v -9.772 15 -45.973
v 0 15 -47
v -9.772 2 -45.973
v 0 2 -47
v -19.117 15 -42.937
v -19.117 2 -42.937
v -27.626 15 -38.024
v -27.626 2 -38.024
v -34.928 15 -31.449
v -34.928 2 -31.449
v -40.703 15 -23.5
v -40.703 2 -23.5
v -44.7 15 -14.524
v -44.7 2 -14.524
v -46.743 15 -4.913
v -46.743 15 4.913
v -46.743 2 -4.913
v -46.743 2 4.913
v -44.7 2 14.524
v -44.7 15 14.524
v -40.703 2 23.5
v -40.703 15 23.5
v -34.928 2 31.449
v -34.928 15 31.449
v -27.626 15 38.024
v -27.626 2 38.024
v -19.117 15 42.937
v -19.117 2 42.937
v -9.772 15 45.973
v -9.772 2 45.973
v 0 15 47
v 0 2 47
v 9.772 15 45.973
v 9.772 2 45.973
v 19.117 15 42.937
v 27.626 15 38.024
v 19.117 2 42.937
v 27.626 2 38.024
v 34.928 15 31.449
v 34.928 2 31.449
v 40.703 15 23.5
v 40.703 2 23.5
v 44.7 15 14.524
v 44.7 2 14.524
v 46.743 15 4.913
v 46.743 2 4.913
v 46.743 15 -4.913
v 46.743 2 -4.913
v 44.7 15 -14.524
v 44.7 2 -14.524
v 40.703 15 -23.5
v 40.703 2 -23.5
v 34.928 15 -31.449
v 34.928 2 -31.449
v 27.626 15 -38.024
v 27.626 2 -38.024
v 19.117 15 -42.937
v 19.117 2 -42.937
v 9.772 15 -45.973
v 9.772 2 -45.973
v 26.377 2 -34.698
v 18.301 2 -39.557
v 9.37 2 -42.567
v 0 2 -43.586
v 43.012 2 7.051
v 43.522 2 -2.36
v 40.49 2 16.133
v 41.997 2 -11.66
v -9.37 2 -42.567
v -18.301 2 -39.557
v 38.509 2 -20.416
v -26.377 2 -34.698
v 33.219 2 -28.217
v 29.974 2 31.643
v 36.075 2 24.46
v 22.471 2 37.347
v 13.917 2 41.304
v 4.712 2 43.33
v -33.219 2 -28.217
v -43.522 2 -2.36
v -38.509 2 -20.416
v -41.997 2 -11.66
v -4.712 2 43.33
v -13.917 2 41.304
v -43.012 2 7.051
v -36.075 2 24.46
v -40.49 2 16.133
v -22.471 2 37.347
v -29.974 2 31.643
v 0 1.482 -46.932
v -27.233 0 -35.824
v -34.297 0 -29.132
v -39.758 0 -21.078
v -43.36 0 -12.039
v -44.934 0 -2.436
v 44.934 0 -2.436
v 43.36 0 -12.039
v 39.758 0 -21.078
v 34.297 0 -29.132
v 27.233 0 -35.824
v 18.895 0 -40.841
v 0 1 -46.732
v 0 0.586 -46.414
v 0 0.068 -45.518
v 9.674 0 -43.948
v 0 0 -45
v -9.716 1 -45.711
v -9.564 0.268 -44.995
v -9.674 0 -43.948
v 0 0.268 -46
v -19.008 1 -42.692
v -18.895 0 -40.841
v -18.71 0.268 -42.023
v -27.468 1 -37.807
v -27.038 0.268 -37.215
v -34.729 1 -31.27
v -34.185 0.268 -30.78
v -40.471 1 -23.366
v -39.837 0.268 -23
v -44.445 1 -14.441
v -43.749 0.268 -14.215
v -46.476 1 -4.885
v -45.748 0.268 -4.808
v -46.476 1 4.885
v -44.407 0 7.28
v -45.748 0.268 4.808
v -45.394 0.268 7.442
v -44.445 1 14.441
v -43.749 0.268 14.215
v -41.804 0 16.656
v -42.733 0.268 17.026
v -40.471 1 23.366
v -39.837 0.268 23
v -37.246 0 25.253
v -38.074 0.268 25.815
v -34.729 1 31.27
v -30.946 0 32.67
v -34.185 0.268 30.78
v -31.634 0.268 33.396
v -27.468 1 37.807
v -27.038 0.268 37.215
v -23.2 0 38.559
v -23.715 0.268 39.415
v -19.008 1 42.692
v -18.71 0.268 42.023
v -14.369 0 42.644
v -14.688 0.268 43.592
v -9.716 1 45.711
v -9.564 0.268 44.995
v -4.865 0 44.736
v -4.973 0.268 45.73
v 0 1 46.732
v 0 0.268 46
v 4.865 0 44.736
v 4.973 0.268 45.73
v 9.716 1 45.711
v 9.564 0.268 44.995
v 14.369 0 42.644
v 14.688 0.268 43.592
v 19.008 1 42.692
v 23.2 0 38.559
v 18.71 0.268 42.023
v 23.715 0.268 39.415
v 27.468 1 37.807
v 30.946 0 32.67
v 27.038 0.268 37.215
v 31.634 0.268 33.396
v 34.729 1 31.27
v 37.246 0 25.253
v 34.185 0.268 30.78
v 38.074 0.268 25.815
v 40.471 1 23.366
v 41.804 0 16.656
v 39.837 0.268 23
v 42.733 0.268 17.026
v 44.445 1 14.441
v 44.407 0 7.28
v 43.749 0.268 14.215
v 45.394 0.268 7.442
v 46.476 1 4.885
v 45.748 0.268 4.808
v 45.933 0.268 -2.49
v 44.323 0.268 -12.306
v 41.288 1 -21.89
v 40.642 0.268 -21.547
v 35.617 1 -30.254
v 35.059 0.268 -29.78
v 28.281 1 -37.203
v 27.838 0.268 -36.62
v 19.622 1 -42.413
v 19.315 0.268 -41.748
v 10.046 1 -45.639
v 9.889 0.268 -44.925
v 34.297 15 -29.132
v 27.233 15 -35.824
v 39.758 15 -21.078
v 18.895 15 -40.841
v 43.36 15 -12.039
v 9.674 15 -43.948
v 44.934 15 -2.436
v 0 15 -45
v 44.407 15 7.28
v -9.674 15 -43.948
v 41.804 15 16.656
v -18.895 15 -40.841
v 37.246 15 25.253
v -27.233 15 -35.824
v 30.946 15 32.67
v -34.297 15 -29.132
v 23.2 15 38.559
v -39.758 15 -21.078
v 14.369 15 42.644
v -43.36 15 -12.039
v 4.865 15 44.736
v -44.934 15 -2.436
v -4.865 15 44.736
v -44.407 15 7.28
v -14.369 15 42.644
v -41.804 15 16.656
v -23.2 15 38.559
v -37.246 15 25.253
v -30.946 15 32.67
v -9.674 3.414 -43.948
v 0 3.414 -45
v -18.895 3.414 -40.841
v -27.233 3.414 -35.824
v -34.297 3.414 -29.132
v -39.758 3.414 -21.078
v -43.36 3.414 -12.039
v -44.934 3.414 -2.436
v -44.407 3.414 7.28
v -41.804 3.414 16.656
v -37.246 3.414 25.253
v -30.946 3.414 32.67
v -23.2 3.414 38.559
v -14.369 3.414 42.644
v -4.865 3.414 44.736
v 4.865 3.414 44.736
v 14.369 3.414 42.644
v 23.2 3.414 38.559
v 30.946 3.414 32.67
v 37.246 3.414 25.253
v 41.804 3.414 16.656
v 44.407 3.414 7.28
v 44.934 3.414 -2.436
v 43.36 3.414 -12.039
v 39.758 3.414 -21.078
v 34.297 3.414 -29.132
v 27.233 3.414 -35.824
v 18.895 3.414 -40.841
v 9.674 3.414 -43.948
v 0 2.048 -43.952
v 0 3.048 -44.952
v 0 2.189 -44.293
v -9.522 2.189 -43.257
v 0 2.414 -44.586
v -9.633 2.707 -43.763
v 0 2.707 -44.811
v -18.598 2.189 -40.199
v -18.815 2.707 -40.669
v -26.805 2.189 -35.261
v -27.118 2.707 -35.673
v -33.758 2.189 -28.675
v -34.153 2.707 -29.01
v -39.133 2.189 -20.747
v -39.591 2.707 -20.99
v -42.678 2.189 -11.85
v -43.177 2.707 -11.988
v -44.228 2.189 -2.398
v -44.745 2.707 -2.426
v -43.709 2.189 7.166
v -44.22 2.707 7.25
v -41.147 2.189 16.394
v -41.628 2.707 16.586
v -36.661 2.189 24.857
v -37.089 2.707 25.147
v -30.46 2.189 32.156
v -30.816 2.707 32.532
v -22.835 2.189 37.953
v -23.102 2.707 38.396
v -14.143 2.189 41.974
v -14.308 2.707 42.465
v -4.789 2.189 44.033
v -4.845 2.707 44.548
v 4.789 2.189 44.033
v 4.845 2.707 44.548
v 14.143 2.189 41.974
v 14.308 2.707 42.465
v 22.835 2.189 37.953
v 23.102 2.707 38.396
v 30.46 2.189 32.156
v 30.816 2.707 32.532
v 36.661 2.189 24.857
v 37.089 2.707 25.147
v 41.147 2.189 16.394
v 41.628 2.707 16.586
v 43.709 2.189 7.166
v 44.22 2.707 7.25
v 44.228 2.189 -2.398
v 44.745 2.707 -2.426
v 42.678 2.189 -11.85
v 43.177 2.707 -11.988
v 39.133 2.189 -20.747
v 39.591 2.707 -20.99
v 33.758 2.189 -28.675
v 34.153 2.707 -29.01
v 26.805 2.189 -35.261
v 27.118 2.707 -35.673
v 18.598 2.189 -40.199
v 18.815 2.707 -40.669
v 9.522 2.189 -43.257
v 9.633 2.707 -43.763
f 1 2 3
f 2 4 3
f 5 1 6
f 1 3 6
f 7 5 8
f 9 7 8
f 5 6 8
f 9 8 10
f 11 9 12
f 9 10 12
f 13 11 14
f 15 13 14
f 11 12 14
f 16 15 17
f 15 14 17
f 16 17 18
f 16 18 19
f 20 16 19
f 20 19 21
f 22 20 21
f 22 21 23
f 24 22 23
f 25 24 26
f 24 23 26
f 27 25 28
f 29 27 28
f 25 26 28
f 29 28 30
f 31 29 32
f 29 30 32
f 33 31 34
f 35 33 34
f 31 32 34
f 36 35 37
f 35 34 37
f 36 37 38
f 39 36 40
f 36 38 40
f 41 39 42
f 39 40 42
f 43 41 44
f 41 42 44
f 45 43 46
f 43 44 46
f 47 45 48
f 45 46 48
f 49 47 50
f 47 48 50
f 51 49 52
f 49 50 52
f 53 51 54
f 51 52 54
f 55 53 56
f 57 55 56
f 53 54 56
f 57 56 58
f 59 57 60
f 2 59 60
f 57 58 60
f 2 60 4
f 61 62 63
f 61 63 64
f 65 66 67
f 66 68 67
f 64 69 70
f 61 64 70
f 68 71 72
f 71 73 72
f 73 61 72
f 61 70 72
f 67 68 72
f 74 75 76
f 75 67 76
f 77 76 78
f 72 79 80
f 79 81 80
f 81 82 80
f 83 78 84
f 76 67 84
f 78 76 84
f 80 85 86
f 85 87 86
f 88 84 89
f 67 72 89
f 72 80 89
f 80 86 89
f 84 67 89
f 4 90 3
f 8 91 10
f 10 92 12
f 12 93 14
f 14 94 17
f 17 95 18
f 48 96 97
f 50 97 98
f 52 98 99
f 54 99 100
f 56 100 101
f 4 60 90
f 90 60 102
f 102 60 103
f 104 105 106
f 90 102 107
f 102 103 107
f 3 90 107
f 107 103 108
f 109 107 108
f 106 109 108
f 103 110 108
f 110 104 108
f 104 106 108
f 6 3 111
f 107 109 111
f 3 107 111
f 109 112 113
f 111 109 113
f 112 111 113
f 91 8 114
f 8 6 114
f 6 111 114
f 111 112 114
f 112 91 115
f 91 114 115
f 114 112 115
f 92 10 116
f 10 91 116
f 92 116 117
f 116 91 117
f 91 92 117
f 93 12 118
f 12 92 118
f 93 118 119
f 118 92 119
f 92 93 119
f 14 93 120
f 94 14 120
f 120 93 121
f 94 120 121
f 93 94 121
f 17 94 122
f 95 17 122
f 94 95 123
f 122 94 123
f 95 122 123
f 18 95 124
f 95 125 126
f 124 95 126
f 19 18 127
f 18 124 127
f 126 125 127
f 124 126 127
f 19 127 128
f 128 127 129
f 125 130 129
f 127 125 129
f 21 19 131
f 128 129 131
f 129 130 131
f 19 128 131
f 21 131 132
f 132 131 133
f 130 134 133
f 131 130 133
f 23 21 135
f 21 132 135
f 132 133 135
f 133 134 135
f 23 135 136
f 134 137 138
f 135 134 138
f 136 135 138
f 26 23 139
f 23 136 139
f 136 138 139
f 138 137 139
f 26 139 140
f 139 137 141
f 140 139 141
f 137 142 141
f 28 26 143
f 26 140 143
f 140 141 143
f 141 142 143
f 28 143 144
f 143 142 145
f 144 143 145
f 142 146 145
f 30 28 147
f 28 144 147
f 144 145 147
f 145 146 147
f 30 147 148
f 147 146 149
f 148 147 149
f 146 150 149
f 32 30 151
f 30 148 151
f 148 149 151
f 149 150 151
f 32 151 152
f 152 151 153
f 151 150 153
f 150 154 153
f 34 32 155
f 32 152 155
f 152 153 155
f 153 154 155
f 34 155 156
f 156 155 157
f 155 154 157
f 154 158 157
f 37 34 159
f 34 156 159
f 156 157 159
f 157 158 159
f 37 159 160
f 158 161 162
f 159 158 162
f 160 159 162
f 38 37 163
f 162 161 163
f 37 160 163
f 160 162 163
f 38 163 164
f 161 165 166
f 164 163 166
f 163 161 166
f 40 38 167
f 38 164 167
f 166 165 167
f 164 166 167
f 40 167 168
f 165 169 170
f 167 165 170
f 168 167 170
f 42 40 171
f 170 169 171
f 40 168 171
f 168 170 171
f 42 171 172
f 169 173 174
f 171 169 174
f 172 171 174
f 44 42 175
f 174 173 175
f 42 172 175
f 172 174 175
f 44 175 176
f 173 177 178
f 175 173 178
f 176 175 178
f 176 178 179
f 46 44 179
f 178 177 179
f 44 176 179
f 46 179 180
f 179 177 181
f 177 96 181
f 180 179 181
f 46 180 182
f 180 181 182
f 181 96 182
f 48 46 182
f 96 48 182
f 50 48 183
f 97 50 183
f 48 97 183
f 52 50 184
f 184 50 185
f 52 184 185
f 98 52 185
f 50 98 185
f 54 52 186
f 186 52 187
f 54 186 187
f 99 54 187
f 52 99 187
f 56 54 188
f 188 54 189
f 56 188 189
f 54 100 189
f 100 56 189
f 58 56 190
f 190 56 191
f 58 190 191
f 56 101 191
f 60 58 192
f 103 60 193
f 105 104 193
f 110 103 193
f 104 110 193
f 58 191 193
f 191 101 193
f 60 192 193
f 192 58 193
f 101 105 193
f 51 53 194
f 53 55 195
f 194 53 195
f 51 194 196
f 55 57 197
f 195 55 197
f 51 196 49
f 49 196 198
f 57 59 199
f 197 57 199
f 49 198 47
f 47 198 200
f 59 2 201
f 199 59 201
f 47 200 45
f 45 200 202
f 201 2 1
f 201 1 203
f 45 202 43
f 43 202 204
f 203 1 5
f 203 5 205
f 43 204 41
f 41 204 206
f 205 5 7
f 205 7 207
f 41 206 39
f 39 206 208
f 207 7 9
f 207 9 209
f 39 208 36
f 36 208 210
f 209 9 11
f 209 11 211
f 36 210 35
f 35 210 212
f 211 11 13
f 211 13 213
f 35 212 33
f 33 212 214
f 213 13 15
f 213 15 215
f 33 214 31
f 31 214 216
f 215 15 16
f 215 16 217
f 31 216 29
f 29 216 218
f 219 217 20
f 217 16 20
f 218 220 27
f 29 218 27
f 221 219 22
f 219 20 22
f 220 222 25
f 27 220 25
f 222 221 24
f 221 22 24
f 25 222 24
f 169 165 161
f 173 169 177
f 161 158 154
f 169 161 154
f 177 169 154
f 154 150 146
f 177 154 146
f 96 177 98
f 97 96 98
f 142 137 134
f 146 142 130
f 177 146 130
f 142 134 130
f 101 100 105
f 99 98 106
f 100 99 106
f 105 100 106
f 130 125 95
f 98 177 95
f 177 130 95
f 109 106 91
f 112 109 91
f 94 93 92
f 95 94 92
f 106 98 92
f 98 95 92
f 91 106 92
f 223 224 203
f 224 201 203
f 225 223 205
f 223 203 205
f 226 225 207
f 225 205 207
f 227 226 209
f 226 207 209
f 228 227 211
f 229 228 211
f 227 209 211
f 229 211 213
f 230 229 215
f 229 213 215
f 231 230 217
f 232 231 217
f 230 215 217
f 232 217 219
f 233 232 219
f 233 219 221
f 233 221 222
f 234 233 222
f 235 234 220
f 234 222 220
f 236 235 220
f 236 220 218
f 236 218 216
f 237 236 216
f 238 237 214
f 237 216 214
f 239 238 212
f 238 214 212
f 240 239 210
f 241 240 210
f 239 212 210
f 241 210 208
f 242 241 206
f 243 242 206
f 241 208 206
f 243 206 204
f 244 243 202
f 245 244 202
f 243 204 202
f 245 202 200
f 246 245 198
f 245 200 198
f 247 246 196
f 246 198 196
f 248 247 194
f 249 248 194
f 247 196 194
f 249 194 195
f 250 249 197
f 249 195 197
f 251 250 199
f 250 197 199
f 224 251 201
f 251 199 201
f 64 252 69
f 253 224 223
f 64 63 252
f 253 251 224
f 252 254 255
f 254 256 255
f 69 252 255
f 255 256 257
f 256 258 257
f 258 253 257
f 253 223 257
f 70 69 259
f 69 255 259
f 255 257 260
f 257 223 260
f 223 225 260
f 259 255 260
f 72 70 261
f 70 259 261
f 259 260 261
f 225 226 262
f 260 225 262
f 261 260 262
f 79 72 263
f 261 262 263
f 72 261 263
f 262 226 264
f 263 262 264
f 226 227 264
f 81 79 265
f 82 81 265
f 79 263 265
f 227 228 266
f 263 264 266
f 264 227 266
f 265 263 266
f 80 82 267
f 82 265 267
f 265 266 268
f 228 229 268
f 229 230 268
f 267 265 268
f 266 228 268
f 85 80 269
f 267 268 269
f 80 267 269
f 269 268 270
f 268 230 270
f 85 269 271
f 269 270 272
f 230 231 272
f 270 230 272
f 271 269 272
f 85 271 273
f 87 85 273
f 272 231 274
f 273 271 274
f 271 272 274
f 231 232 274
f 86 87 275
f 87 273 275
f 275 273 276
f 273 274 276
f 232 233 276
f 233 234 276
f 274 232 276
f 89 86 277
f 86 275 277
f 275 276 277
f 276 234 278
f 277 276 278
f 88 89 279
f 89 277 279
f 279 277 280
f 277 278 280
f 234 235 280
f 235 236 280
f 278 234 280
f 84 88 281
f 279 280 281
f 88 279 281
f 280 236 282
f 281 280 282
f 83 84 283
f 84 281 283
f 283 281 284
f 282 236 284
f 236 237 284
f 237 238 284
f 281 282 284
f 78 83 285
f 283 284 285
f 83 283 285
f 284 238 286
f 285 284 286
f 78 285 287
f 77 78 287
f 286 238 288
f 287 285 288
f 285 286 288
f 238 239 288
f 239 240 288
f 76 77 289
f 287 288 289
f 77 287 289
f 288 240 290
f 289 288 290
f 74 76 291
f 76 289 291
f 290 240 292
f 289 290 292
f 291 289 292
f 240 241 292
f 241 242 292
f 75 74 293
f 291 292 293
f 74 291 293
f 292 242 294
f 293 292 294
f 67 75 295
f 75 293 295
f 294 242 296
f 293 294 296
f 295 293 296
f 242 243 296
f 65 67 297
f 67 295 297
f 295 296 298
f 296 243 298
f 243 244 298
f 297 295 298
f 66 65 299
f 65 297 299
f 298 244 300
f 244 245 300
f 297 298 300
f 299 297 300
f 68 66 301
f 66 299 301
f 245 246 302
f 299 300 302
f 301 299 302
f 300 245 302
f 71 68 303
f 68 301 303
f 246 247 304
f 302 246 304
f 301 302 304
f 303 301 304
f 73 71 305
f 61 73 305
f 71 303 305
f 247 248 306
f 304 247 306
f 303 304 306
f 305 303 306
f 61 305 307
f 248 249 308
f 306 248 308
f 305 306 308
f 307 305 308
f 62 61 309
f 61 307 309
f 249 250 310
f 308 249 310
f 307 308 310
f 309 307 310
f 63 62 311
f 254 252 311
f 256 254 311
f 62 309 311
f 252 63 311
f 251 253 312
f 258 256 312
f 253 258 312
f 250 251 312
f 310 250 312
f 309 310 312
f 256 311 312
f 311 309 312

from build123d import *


with BuildPart() as part:
    # Croquis1 → Revolución1 (revolve)
    with BuildSketch(Plane.XY, mode=Mode.PRIVATE) as revoluci_n1_sk:
        with BuildLine():
            Line((45, 0), (0, 0))
            Line((0, 0), (0, 2))
            Line((0, 2), (43.585786438, 2))
            ThreePointArc((43.585786438, 2), (44.585786438, 2.414213562), (45, 3.414213562))
            Line((45, 3.414213562), (45, 15))
            Line((45, 15), (47, 15))
            Line((47, 15), (47, 2))
            ThreePointArc((47, 2), (46.414213562, 0.585786438), (45, 0))
        make_face()
    revolve(revoluci_n1_sk.sketch.rotate(Axis((0, 0, 0), (0, 1, 0)), 90), axis=Axis((0, 0, 0), (0, 1, 0)))


solid = part.part
